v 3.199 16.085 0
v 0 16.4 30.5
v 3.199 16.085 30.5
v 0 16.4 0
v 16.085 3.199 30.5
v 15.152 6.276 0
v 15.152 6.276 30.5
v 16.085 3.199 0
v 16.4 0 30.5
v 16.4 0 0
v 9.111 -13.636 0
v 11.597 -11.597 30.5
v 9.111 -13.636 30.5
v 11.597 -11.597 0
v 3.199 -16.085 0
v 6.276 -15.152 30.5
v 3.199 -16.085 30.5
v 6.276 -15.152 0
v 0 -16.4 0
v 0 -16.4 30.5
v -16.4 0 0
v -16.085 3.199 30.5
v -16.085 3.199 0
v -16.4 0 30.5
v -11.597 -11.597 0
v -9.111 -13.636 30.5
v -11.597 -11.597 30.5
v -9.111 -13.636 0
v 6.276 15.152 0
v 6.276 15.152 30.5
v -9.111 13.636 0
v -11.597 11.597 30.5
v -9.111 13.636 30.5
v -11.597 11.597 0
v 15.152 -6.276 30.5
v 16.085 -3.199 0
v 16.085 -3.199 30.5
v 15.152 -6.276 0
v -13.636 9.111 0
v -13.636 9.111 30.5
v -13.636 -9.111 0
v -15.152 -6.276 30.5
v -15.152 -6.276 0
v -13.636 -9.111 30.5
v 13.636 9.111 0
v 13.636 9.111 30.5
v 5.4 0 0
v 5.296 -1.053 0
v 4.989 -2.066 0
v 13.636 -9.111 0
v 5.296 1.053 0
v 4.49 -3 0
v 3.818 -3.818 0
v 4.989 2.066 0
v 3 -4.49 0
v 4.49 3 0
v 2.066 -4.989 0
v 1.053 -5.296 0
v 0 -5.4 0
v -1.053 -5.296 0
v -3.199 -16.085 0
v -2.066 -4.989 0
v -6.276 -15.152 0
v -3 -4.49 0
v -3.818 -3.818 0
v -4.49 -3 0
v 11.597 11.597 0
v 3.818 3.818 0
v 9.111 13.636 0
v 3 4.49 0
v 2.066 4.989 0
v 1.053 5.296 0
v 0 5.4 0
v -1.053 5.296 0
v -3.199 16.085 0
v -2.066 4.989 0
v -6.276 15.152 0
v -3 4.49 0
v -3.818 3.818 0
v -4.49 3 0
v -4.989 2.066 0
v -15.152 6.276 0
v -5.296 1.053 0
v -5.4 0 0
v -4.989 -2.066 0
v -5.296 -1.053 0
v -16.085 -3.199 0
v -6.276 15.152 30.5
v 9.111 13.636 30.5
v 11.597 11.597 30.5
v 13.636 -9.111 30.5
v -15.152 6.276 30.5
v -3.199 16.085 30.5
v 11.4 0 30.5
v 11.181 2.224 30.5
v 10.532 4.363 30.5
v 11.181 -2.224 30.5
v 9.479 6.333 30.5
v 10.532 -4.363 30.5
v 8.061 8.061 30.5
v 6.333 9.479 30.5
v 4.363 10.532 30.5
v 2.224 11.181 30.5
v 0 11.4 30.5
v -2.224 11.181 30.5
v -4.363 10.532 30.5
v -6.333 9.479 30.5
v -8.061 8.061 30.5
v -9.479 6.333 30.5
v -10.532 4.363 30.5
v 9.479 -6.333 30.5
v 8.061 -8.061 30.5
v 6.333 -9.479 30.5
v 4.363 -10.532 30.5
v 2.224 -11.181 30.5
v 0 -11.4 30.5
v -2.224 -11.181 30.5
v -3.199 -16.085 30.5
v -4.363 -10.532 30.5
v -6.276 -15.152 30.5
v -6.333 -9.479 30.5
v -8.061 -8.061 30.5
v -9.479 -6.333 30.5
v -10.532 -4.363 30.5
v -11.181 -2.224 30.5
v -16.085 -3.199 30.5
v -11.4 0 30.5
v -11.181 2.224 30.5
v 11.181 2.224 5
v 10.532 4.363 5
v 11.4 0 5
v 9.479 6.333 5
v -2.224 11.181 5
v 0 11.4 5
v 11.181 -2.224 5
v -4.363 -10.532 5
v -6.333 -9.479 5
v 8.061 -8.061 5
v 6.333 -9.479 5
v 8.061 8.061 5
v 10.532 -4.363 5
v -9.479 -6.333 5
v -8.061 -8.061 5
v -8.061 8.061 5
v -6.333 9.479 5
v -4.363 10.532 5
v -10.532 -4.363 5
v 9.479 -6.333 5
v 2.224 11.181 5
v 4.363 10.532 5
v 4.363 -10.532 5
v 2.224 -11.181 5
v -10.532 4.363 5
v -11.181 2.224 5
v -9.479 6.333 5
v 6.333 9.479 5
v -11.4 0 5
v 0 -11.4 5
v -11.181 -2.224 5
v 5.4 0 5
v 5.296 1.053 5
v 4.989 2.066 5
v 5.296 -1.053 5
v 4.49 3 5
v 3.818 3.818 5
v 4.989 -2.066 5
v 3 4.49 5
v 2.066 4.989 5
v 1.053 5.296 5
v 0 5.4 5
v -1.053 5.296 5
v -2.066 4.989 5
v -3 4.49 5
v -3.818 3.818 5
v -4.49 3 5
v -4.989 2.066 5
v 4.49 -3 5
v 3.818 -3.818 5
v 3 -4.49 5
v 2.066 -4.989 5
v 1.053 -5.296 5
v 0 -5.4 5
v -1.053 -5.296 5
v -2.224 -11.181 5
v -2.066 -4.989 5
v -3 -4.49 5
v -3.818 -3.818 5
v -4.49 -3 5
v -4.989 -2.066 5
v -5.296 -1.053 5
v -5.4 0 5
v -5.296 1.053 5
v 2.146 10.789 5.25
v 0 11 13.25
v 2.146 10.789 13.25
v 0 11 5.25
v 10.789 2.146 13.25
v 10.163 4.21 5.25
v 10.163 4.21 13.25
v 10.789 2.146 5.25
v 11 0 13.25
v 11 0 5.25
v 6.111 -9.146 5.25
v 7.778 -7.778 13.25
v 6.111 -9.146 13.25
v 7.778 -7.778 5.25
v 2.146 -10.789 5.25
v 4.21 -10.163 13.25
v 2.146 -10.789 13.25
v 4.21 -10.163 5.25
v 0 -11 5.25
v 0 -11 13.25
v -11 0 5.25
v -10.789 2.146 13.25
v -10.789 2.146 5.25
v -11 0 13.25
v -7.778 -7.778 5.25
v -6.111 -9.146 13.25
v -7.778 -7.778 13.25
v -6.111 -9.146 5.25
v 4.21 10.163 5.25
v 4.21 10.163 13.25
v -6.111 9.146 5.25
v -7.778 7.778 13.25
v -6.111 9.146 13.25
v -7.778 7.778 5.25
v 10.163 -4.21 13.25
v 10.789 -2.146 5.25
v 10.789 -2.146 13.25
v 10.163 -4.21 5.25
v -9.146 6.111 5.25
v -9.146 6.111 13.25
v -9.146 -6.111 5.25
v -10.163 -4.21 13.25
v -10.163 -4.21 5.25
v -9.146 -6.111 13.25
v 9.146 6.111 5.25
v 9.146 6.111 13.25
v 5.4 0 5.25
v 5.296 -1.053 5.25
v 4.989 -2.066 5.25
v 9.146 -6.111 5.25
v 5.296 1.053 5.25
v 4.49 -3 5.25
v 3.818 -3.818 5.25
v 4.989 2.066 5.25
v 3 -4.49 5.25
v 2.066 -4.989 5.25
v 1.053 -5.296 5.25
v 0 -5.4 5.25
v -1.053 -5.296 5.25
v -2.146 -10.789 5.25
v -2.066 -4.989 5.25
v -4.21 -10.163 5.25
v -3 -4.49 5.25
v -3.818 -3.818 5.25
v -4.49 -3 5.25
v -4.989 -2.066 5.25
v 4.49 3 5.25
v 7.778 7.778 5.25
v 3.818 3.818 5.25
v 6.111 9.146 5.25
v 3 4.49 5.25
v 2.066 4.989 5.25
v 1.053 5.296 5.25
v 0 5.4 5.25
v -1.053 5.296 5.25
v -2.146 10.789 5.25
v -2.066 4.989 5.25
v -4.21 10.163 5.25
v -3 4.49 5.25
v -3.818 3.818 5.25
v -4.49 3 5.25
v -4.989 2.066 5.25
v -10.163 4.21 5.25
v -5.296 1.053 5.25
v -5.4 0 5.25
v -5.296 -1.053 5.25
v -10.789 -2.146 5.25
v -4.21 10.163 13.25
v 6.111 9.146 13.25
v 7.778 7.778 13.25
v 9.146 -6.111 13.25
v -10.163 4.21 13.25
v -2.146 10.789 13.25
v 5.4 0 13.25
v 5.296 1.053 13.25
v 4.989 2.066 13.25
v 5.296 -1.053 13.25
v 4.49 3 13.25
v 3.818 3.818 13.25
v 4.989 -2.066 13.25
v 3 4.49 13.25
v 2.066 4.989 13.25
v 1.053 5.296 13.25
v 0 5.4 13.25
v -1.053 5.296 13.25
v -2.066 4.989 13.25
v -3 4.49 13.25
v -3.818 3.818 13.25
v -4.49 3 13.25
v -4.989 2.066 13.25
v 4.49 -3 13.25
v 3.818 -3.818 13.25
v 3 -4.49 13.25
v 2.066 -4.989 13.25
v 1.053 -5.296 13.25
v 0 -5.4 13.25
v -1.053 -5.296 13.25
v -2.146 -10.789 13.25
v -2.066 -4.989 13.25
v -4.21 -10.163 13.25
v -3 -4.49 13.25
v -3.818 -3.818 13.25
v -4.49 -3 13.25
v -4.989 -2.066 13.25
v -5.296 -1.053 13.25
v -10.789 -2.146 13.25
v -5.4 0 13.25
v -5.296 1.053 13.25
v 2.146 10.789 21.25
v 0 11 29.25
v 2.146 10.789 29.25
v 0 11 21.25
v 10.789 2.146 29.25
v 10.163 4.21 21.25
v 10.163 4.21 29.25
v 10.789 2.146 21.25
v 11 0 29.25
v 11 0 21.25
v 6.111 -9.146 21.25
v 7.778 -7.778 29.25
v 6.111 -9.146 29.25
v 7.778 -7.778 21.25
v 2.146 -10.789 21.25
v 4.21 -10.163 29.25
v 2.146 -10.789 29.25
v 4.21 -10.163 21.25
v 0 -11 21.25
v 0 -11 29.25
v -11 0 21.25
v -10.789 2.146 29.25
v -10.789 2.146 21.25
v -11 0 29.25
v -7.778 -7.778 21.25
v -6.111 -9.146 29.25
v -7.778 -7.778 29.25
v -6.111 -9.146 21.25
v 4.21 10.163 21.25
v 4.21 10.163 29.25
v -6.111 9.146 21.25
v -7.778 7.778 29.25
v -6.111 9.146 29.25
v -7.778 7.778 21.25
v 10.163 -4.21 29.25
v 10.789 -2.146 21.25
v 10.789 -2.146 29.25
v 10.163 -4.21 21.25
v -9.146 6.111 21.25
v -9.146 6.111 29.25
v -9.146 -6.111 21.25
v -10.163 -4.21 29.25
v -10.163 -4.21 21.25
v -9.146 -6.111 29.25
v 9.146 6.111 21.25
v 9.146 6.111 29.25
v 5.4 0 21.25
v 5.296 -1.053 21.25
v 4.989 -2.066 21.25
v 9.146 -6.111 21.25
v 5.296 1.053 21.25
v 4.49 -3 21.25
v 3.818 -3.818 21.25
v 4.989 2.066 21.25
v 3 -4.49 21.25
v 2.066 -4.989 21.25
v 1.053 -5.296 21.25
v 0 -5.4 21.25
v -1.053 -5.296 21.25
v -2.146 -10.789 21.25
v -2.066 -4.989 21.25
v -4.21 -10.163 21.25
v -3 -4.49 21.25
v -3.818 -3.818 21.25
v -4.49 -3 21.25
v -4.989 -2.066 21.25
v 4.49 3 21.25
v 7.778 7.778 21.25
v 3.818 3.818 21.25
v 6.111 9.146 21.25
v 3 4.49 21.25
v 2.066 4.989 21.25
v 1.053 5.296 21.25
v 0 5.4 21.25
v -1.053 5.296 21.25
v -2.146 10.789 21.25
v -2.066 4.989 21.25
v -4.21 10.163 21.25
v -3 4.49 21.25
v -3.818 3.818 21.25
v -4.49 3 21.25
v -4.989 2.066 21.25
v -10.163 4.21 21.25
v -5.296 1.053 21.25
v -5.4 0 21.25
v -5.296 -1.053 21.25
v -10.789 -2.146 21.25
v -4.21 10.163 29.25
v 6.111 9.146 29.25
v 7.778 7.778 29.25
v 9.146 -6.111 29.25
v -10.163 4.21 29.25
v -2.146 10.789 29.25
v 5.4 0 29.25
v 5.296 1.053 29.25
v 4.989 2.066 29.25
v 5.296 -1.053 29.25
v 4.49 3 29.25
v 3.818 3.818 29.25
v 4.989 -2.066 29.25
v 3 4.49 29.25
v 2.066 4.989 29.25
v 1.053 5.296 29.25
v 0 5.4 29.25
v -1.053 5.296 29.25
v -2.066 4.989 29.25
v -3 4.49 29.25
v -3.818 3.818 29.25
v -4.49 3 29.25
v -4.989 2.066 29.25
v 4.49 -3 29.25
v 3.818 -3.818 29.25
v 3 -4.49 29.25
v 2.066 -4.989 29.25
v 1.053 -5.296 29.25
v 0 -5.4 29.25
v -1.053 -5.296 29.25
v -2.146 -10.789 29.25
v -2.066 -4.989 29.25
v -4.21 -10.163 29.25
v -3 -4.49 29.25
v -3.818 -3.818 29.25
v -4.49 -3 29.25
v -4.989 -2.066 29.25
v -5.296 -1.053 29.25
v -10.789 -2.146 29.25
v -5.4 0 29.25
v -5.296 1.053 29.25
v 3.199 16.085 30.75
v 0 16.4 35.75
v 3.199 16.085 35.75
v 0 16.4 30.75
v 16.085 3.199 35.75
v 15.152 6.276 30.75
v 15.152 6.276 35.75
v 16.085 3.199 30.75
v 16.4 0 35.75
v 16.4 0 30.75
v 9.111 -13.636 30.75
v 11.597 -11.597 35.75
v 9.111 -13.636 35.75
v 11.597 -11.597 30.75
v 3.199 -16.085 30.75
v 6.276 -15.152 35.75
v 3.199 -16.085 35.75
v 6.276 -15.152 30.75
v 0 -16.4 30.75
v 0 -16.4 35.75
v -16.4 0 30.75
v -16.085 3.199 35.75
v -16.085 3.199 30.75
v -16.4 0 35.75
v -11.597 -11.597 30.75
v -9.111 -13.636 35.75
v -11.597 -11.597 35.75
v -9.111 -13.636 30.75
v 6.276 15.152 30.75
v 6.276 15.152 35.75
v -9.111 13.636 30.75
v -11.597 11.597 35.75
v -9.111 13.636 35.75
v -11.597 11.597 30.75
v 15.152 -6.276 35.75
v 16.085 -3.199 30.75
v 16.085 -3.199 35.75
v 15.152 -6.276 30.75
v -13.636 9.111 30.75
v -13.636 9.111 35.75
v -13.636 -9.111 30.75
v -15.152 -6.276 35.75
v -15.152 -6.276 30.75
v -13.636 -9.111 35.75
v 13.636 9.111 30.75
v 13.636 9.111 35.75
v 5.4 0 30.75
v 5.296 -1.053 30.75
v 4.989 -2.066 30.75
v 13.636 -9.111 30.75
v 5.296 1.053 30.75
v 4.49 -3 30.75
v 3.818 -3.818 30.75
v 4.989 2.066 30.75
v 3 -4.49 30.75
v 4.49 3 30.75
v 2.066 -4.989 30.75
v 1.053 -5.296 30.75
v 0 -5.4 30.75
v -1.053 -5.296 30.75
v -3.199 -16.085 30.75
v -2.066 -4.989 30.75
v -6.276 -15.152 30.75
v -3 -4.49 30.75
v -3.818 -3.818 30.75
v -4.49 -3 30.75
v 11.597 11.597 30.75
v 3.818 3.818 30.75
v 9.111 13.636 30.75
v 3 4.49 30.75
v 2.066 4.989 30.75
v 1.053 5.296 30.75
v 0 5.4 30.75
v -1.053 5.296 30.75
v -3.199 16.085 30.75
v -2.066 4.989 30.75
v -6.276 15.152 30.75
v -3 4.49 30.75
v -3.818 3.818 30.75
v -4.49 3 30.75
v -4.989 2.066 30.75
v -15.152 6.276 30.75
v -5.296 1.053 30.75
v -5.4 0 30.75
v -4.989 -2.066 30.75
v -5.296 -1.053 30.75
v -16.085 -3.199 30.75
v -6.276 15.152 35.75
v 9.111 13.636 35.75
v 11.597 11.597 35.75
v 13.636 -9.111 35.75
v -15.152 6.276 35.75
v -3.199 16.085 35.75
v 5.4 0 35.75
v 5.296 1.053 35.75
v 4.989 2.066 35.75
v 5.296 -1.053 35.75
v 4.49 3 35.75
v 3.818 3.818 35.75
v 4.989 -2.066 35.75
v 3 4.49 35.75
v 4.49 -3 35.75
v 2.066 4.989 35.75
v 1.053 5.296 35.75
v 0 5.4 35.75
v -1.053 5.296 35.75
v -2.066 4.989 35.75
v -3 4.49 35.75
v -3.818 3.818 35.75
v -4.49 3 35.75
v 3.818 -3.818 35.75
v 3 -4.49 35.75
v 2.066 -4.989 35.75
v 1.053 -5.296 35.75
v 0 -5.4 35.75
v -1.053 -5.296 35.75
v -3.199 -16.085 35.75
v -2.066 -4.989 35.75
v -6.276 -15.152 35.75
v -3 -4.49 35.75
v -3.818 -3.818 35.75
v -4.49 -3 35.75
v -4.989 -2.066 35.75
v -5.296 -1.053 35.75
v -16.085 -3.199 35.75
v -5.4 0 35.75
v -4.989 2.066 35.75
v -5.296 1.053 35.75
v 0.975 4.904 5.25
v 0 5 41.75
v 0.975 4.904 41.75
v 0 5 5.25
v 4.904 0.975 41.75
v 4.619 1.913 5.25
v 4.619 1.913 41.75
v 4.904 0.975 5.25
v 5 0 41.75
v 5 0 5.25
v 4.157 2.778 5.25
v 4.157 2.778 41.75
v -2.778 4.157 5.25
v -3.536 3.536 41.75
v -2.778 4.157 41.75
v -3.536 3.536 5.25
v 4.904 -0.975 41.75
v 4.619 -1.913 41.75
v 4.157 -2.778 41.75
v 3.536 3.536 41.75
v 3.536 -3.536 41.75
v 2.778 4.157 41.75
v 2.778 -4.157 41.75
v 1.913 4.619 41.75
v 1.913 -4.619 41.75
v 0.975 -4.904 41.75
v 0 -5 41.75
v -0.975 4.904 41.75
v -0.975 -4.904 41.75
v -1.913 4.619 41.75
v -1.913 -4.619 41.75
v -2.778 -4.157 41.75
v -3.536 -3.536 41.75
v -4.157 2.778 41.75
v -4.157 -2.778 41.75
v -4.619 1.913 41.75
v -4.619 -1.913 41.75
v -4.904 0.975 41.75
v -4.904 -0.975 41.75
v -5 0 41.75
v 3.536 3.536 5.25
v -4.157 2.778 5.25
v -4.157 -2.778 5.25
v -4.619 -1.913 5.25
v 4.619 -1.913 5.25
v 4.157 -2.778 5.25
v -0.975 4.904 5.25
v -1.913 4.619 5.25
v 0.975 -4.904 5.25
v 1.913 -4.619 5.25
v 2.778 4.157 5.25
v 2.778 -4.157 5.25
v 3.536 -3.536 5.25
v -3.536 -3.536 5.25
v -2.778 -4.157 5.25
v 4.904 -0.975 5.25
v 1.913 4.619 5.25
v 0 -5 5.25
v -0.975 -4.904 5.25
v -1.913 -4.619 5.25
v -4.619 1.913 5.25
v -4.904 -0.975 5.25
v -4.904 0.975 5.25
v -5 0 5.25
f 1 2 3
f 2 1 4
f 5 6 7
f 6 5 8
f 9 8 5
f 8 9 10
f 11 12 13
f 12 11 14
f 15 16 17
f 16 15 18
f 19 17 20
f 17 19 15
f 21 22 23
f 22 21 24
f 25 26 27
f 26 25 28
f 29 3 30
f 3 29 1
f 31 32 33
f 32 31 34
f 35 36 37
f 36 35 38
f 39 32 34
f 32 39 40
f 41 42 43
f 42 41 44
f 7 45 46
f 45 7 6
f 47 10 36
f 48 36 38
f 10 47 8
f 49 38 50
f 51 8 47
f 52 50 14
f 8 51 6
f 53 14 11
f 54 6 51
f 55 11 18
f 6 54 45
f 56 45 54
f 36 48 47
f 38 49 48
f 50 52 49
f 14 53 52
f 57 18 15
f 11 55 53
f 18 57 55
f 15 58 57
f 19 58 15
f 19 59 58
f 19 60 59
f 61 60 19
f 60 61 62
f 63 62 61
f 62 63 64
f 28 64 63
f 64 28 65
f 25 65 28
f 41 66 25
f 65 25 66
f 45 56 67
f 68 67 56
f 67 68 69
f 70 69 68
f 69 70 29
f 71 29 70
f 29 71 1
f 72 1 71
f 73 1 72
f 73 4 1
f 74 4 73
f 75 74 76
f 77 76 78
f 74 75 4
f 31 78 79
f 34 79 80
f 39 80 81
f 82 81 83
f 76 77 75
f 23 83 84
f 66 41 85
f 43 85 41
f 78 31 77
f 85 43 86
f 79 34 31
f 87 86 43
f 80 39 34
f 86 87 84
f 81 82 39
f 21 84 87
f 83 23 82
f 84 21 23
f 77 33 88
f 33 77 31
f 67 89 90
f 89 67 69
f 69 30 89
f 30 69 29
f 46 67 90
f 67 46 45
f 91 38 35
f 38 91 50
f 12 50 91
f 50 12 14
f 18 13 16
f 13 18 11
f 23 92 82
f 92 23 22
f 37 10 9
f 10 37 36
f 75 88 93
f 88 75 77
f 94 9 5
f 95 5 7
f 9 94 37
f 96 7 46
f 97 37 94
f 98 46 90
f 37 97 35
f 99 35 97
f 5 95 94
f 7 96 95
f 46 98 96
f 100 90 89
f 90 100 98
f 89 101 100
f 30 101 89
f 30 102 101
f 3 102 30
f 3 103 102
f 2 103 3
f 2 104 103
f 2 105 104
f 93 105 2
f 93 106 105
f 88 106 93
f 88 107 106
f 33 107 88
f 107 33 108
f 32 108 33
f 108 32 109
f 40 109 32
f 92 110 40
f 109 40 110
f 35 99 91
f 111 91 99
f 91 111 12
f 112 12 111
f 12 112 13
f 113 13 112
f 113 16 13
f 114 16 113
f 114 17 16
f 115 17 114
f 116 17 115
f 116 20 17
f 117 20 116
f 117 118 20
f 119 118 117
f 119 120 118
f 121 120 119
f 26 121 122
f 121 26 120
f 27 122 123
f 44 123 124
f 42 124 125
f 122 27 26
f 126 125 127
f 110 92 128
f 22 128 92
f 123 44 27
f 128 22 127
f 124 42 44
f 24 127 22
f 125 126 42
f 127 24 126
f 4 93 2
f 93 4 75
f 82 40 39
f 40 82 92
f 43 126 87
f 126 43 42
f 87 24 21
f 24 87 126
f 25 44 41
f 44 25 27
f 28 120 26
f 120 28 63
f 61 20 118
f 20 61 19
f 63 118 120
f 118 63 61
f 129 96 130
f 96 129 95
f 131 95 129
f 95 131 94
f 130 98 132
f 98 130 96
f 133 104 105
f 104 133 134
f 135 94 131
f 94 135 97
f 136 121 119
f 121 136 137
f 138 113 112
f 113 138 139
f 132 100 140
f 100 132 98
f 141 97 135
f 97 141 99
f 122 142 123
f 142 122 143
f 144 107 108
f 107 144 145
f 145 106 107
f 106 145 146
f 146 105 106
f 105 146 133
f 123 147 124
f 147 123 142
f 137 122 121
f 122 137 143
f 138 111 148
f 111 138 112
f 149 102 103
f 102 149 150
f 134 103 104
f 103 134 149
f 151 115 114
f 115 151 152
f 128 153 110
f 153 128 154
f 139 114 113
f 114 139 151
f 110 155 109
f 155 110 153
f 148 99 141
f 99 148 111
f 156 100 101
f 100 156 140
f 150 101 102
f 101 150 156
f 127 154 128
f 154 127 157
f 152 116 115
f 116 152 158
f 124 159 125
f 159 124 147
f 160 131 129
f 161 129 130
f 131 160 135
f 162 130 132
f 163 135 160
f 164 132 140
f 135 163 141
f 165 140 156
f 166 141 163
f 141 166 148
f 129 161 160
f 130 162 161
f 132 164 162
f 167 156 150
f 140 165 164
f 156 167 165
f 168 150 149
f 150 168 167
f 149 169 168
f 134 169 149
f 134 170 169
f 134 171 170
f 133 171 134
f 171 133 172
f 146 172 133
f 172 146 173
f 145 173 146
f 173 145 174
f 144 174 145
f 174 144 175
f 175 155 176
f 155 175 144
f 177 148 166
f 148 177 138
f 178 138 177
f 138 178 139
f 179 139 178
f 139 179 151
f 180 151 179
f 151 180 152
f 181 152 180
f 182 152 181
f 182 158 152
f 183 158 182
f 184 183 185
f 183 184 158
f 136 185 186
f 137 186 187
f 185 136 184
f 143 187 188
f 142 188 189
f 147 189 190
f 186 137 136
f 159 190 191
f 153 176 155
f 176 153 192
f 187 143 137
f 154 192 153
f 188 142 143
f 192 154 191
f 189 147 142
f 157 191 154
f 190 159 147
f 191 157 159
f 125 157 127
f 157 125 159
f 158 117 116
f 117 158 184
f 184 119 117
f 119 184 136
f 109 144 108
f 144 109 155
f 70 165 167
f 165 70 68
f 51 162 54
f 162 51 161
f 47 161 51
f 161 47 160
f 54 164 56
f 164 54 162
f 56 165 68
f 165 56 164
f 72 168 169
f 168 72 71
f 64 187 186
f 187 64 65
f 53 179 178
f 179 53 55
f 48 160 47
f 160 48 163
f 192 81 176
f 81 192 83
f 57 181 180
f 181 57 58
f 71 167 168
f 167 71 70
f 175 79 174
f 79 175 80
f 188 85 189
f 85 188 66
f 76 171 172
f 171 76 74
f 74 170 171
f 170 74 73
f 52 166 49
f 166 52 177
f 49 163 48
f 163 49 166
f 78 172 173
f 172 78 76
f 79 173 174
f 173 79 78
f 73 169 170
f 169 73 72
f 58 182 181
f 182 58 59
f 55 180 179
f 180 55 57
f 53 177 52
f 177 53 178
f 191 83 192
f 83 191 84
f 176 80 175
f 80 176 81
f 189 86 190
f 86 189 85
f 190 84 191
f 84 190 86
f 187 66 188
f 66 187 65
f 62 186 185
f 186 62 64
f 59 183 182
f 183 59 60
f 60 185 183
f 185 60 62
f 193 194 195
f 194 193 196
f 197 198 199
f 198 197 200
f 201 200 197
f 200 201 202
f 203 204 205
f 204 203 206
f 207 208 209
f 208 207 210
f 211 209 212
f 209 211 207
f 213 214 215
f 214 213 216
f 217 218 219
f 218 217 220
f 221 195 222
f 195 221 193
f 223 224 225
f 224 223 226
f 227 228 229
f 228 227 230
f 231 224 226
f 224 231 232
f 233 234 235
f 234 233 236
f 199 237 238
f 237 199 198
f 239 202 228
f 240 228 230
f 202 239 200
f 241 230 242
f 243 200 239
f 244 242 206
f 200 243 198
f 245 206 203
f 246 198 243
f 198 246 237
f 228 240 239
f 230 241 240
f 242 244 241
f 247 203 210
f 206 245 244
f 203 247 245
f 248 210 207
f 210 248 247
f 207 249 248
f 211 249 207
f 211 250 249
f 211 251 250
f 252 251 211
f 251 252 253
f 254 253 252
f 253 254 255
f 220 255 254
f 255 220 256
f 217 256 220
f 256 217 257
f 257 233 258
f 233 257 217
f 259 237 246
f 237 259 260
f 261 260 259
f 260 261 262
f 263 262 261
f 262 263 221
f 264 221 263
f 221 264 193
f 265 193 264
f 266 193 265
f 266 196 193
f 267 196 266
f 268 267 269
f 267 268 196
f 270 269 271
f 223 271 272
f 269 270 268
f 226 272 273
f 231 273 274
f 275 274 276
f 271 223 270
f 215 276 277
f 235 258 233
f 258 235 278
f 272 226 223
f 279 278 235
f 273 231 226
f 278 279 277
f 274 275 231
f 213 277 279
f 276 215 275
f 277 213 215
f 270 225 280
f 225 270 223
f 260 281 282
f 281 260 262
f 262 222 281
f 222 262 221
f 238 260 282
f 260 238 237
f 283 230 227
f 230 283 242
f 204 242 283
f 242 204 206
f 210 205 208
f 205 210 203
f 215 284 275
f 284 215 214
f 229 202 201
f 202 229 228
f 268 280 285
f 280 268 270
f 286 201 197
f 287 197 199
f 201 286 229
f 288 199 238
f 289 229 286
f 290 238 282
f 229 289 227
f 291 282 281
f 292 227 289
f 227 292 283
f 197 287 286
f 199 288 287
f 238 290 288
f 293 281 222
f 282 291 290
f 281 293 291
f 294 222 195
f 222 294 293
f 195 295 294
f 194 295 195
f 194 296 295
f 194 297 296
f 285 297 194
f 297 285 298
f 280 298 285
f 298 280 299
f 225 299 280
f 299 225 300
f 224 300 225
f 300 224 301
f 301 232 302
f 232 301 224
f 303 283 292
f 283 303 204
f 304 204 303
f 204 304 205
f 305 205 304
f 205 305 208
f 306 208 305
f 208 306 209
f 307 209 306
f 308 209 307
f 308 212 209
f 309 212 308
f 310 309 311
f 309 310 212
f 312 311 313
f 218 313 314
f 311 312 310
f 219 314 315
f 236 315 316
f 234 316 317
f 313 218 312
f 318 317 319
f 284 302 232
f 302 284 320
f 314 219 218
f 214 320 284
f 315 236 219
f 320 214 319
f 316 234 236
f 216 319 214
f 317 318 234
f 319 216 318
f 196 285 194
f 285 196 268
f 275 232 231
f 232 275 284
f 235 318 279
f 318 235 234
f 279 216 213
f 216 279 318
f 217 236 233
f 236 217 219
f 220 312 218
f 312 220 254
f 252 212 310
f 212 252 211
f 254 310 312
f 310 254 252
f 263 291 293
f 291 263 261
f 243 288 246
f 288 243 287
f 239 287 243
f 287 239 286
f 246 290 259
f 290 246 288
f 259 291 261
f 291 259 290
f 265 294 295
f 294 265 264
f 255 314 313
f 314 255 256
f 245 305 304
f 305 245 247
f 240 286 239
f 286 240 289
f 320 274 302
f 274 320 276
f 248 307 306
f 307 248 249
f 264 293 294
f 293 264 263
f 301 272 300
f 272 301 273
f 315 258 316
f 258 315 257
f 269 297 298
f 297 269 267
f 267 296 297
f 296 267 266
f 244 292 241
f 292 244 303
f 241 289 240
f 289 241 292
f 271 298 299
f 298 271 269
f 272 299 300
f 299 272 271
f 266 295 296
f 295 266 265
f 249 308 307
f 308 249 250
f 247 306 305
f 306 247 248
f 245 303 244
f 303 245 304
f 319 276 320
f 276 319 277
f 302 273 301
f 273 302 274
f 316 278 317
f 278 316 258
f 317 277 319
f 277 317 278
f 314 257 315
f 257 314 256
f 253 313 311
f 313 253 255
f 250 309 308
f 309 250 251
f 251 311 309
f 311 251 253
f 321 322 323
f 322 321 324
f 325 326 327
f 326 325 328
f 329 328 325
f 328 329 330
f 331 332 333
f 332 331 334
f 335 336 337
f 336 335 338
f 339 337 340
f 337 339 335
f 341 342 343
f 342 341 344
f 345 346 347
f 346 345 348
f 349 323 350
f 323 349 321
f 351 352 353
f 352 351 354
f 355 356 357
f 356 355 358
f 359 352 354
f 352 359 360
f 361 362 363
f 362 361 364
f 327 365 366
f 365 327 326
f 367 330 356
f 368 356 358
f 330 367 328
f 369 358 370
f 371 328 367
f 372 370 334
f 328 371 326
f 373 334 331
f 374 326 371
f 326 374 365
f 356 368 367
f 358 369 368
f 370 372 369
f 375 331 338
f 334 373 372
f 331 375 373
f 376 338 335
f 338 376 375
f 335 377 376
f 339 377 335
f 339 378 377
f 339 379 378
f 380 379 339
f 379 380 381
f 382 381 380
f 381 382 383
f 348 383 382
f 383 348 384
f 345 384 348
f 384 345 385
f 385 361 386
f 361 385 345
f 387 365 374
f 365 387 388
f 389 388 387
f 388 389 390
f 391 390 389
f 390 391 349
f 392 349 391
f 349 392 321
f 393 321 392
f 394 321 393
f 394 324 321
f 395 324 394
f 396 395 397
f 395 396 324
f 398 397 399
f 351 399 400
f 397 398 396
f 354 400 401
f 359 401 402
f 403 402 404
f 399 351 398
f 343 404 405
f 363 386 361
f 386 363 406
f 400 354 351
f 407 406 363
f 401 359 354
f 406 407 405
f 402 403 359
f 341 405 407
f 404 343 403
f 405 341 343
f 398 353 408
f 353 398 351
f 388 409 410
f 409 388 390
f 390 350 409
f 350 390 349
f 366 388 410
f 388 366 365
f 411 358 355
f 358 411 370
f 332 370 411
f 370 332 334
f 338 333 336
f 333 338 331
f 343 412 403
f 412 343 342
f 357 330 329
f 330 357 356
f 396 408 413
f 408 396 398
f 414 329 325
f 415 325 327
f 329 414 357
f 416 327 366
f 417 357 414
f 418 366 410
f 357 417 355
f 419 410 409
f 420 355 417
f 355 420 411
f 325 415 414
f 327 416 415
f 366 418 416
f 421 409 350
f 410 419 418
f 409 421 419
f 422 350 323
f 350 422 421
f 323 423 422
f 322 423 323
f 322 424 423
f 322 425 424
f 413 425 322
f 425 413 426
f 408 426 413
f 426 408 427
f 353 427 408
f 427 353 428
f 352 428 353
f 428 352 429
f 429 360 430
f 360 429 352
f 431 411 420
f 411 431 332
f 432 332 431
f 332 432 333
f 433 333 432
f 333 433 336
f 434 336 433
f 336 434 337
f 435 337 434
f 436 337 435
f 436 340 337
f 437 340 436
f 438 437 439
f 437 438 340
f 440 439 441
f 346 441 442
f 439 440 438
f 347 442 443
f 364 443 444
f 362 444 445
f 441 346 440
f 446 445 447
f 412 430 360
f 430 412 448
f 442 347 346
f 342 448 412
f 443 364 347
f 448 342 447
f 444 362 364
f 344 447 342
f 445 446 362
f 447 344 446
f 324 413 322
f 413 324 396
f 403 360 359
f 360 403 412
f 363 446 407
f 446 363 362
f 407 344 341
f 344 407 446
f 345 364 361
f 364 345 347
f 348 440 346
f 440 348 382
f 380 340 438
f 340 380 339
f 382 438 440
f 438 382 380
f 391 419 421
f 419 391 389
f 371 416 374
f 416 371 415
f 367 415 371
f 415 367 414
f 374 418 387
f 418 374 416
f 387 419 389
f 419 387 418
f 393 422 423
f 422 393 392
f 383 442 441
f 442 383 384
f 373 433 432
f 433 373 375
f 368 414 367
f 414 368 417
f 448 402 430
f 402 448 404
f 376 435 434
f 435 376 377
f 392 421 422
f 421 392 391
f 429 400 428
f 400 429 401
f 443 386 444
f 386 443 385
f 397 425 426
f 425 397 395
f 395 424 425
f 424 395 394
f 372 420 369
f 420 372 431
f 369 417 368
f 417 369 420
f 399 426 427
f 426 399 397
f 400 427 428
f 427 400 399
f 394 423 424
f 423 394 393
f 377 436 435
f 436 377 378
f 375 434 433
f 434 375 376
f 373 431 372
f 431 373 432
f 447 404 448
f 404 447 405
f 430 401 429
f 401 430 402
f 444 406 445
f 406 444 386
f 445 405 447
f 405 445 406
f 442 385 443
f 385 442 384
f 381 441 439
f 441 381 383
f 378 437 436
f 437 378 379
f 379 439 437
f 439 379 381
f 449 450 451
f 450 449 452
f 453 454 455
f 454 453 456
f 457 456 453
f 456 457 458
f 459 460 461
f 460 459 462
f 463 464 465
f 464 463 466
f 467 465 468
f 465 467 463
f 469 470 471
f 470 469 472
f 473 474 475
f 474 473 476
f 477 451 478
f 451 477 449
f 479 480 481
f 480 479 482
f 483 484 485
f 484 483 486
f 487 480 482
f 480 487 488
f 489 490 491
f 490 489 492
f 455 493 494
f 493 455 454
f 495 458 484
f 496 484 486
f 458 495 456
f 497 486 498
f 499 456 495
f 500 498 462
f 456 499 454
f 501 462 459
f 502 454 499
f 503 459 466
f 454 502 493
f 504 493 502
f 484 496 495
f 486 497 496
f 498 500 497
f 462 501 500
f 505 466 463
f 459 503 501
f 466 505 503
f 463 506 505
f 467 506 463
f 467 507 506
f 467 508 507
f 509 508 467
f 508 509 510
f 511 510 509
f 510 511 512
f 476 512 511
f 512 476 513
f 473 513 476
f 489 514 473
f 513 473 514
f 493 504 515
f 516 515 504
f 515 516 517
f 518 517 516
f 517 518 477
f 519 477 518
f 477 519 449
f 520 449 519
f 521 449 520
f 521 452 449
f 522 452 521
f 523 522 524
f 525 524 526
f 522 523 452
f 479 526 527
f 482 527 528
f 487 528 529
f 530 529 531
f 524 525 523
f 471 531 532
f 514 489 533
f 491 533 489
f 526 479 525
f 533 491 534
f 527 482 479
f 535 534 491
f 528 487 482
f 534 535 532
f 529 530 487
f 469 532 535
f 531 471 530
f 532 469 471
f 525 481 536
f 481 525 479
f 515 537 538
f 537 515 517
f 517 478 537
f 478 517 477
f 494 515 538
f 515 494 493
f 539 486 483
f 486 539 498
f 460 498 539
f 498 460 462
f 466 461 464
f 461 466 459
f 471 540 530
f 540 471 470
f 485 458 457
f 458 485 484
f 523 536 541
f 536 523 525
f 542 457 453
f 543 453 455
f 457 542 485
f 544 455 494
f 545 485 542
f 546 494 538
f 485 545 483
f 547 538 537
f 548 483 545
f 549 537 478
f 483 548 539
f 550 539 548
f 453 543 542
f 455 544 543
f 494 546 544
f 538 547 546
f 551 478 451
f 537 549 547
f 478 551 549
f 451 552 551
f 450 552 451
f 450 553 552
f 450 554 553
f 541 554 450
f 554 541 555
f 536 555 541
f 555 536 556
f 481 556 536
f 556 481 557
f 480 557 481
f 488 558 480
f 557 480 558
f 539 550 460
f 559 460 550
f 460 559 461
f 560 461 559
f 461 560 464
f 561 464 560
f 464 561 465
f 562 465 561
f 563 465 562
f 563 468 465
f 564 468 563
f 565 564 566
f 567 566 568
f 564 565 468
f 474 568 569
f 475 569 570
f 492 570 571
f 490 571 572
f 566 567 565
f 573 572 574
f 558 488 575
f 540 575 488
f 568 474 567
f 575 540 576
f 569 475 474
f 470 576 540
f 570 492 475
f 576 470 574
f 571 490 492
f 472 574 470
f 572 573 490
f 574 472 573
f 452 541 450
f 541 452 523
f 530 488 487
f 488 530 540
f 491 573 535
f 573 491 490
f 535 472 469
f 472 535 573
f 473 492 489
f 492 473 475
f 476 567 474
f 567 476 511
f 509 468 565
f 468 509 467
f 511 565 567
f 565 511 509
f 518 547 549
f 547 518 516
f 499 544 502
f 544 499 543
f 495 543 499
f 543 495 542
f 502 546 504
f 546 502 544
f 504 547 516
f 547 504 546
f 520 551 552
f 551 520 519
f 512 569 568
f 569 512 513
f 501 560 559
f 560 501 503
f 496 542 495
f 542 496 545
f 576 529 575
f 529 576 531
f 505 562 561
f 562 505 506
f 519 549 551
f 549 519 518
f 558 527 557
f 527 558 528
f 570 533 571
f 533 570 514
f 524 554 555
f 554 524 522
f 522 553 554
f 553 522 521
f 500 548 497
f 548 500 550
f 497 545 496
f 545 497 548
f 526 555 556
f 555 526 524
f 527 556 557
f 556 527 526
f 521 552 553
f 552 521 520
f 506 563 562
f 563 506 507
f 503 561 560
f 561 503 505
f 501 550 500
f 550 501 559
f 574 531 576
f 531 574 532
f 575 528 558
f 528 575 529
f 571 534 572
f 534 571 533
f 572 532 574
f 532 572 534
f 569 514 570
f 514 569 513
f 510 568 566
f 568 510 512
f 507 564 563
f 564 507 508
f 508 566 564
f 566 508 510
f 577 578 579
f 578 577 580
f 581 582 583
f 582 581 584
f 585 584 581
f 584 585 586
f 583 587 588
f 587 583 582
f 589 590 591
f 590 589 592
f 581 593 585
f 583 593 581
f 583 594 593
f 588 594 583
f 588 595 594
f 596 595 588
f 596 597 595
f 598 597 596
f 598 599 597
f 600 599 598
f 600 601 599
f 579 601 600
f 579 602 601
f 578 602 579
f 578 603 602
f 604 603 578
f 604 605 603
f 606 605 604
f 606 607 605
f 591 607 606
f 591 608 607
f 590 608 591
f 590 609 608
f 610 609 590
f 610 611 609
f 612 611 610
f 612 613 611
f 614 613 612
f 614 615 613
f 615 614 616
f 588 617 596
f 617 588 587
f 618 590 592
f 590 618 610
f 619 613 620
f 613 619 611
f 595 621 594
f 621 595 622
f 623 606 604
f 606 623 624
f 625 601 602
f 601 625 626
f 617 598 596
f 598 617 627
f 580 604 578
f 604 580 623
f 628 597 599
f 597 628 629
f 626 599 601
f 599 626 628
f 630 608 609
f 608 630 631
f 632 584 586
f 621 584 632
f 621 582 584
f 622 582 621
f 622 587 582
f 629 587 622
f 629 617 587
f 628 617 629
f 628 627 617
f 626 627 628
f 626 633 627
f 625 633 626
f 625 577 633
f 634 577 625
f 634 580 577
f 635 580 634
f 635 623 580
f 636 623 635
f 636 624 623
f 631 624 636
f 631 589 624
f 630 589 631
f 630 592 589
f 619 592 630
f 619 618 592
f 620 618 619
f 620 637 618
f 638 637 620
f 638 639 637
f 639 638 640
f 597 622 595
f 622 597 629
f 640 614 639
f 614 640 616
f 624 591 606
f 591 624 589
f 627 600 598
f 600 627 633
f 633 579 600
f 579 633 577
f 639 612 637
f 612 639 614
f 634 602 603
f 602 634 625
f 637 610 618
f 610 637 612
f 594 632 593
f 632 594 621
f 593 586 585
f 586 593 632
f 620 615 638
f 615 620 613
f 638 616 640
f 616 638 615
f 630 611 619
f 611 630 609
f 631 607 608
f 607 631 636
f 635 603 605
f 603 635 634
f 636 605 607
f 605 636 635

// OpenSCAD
$fn = 32;

// ------------------------------------------------------------------------
// Shaft station: cup d32.8 x 30.5 mm, shaft d10
// Every part is its own module, assembly() places every instance.
// ------------------------------------------------------------------------

// --- part 1 ---
module housing_cup() {
  difference() {
    cylinder(h = 30.5, d = 32.8);
    translate([0, 0, 5]) cylinder(h = 26.5, d = 22.8);
    translate([0, 0, -1]) cylinder(h = 7, d = 10.8);
  }
}

// --- part 2 ---
module bearing_lower() {
  difference() {
      translate([0, 0, 0]) cylinder(h = 8, d = 22);
      translate([0, 0, -1]) cylinder(h = 10, d = 10.8);
    }
}

// --- part 3 ---
module bearing_upper() {
  difference() {
      translate([0, 0, 0]) cylinder(h = 8, d = 22);
      translate([0, 0, -1]) cylinder(h = 10, d = 10.8);
    }
}

// --- part 4 ---
module station_shaft() {
  translate([0, 0, -18.25]) cylinder(h = 36.5, d = 10);
}

// --- part 5 ---
module station_cover() {
  difference() {
    cylinder(h = 5, d = 32.8);
    translate([0, 0, -1]) cylinder(h = 7, d = 10.8);
  }
}

// --- assembly ---
module assembly() {
  color([0.80, 0.24, 0.20]) translate([0, 0, 0]) rotate([0, 0, 0]) housing_cup();
  color([0.20, 0.45, 0.75]) translate([0, 0, 5.25]) rotate([0, 0, 0]) bearing_lower();
  color([0.25, 0.62, 0.32]) translate([0, 0, 21.25]) rotate([0, 0, 0]) bearing_upper();
  color([0.92, 0.70, 0.18]) translate([0, 0, 23.5]) rotate([0, 0, 0]) station_shaft();
  color([0.58, 0.35, 0.70]) translate([0, 0, 30.75]) rotate([0, 0, 0]) station_cover();
}

assembly();
